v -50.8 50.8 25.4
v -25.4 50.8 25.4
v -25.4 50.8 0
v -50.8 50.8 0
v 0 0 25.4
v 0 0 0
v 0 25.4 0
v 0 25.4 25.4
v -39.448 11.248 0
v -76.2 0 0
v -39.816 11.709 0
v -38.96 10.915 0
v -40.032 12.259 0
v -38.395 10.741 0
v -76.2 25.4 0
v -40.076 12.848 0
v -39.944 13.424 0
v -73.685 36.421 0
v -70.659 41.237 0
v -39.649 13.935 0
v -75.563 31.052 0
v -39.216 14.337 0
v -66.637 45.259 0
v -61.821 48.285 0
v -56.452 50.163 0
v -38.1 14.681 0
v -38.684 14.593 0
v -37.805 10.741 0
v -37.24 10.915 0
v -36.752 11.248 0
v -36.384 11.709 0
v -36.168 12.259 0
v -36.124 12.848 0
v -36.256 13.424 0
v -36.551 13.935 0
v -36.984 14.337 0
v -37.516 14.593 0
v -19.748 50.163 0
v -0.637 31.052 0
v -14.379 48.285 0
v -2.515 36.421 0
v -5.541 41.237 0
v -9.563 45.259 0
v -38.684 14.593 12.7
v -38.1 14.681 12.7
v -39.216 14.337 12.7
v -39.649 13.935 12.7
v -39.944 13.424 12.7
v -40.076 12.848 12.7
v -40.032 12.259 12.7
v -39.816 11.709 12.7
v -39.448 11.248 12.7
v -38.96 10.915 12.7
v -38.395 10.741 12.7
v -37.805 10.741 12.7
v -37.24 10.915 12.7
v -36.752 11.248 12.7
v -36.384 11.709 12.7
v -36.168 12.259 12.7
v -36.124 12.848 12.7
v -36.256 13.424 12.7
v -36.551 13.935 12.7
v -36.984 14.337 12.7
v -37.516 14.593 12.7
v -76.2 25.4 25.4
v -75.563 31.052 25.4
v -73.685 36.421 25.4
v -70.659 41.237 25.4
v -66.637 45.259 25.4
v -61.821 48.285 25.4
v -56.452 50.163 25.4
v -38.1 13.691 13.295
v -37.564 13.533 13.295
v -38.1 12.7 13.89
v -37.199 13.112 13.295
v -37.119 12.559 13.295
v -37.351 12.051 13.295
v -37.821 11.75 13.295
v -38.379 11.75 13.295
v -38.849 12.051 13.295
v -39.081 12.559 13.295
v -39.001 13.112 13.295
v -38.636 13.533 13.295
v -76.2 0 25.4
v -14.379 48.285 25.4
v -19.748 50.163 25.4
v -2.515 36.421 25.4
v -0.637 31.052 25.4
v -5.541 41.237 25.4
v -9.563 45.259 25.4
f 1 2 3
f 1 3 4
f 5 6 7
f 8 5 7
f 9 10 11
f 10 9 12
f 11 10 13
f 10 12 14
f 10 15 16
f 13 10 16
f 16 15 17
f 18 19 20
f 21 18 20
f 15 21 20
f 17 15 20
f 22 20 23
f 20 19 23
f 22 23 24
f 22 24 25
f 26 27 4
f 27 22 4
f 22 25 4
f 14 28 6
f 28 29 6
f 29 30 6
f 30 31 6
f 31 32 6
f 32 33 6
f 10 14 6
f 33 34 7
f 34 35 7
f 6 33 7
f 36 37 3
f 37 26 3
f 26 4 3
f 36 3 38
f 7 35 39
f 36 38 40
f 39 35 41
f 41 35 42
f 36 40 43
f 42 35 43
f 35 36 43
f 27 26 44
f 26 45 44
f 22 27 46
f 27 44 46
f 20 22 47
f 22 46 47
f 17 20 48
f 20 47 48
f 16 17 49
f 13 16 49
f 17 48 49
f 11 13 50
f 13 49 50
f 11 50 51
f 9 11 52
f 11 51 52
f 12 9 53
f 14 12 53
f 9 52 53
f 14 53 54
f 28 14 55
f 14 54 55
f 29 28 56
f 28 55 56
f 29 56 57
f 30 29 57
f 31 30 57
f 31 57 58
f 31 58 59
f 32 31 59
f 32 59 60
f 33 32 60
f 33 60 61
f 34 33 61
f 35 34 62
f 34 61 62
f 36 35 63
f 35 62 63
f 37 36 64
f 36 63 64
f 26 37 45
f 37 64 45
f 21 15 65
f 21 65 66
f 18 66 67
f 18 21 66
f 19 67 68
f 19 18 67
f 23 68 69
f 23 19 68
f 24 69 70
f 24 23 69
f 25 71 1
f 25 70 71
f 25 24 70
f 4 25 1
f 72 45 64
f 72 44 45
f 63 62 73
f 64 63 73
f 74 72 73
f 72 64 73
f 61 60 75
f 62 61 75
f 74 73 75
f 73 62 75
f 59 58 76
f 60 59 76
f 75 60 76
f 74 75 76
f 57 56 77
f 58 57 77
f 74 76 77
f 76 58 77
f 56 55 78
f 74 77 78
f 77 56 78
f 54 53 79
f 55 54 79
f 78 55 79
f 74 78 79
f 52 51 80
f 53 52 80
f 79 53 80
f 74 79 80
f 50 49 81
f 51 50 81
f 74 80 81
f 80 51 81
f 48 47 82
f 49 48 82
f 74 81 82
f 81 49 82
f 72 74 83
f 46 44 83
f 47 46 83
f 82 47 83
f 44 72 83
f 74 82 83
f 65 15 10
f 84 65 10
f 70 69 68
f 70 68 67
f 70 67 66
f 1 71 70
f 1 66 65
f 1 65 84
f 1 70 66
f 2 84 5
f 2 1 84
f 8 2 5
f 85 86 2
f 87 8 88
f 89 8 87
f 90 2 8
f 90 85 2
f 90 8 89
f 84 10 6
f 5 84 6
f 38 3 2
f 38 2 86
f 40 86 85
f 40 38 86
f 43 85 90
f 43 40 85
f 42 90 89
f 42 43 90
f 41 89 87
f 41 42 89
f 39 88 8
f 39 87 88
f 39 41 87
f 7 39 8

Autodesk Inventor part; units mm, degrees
ref_plane "YZ Plane" through (0, 0, 0) normal (1, 0, 0) x (0, 1, 0)
ref_plane "XZ Plane" through (0, 0, 0) normal (0, 1, 0) x (-1, 0, 0)
ref_plane "XY Plane" through (0, 0, 0) normal (0, 0, 1) x (1, 0, 0)
sketch "Sketch1" plane through (0, 0, 0) normal (0, 0, 1) x (1, 0, 0)
  line L0 (0, 0) -> (0, 25.4)
  arc A0 (0, 25.4) -> (-25.4, 50.8) centre (-25.4, 25.4) ccw
  line L1 (-25.4, 50.8) -> (-50.8, 50.8)
  arc A1 (-50.8, 50.8) -> (-76.2, 25.4) centre (-50.8, 25.4) ccw
  line L2 (-76.2, 25.4) -> (-76.2, 0)
  line L3 (-76.2, 0) -> (0, 0)
  point P0 (-38.1, 12.7)
extrude "Extrusion1" add sketch "Sketch1" along normal blind 25.4
hole "Hole1" at (-38.1, 12.7, 0) direction (0, 0, 1) diameter 3.9624 depth 12.7 tip angle 118 thread size "10-32 UNF" class "2B" standard "ANSI Unified Screw Threads"
properties part number "arc_test"
